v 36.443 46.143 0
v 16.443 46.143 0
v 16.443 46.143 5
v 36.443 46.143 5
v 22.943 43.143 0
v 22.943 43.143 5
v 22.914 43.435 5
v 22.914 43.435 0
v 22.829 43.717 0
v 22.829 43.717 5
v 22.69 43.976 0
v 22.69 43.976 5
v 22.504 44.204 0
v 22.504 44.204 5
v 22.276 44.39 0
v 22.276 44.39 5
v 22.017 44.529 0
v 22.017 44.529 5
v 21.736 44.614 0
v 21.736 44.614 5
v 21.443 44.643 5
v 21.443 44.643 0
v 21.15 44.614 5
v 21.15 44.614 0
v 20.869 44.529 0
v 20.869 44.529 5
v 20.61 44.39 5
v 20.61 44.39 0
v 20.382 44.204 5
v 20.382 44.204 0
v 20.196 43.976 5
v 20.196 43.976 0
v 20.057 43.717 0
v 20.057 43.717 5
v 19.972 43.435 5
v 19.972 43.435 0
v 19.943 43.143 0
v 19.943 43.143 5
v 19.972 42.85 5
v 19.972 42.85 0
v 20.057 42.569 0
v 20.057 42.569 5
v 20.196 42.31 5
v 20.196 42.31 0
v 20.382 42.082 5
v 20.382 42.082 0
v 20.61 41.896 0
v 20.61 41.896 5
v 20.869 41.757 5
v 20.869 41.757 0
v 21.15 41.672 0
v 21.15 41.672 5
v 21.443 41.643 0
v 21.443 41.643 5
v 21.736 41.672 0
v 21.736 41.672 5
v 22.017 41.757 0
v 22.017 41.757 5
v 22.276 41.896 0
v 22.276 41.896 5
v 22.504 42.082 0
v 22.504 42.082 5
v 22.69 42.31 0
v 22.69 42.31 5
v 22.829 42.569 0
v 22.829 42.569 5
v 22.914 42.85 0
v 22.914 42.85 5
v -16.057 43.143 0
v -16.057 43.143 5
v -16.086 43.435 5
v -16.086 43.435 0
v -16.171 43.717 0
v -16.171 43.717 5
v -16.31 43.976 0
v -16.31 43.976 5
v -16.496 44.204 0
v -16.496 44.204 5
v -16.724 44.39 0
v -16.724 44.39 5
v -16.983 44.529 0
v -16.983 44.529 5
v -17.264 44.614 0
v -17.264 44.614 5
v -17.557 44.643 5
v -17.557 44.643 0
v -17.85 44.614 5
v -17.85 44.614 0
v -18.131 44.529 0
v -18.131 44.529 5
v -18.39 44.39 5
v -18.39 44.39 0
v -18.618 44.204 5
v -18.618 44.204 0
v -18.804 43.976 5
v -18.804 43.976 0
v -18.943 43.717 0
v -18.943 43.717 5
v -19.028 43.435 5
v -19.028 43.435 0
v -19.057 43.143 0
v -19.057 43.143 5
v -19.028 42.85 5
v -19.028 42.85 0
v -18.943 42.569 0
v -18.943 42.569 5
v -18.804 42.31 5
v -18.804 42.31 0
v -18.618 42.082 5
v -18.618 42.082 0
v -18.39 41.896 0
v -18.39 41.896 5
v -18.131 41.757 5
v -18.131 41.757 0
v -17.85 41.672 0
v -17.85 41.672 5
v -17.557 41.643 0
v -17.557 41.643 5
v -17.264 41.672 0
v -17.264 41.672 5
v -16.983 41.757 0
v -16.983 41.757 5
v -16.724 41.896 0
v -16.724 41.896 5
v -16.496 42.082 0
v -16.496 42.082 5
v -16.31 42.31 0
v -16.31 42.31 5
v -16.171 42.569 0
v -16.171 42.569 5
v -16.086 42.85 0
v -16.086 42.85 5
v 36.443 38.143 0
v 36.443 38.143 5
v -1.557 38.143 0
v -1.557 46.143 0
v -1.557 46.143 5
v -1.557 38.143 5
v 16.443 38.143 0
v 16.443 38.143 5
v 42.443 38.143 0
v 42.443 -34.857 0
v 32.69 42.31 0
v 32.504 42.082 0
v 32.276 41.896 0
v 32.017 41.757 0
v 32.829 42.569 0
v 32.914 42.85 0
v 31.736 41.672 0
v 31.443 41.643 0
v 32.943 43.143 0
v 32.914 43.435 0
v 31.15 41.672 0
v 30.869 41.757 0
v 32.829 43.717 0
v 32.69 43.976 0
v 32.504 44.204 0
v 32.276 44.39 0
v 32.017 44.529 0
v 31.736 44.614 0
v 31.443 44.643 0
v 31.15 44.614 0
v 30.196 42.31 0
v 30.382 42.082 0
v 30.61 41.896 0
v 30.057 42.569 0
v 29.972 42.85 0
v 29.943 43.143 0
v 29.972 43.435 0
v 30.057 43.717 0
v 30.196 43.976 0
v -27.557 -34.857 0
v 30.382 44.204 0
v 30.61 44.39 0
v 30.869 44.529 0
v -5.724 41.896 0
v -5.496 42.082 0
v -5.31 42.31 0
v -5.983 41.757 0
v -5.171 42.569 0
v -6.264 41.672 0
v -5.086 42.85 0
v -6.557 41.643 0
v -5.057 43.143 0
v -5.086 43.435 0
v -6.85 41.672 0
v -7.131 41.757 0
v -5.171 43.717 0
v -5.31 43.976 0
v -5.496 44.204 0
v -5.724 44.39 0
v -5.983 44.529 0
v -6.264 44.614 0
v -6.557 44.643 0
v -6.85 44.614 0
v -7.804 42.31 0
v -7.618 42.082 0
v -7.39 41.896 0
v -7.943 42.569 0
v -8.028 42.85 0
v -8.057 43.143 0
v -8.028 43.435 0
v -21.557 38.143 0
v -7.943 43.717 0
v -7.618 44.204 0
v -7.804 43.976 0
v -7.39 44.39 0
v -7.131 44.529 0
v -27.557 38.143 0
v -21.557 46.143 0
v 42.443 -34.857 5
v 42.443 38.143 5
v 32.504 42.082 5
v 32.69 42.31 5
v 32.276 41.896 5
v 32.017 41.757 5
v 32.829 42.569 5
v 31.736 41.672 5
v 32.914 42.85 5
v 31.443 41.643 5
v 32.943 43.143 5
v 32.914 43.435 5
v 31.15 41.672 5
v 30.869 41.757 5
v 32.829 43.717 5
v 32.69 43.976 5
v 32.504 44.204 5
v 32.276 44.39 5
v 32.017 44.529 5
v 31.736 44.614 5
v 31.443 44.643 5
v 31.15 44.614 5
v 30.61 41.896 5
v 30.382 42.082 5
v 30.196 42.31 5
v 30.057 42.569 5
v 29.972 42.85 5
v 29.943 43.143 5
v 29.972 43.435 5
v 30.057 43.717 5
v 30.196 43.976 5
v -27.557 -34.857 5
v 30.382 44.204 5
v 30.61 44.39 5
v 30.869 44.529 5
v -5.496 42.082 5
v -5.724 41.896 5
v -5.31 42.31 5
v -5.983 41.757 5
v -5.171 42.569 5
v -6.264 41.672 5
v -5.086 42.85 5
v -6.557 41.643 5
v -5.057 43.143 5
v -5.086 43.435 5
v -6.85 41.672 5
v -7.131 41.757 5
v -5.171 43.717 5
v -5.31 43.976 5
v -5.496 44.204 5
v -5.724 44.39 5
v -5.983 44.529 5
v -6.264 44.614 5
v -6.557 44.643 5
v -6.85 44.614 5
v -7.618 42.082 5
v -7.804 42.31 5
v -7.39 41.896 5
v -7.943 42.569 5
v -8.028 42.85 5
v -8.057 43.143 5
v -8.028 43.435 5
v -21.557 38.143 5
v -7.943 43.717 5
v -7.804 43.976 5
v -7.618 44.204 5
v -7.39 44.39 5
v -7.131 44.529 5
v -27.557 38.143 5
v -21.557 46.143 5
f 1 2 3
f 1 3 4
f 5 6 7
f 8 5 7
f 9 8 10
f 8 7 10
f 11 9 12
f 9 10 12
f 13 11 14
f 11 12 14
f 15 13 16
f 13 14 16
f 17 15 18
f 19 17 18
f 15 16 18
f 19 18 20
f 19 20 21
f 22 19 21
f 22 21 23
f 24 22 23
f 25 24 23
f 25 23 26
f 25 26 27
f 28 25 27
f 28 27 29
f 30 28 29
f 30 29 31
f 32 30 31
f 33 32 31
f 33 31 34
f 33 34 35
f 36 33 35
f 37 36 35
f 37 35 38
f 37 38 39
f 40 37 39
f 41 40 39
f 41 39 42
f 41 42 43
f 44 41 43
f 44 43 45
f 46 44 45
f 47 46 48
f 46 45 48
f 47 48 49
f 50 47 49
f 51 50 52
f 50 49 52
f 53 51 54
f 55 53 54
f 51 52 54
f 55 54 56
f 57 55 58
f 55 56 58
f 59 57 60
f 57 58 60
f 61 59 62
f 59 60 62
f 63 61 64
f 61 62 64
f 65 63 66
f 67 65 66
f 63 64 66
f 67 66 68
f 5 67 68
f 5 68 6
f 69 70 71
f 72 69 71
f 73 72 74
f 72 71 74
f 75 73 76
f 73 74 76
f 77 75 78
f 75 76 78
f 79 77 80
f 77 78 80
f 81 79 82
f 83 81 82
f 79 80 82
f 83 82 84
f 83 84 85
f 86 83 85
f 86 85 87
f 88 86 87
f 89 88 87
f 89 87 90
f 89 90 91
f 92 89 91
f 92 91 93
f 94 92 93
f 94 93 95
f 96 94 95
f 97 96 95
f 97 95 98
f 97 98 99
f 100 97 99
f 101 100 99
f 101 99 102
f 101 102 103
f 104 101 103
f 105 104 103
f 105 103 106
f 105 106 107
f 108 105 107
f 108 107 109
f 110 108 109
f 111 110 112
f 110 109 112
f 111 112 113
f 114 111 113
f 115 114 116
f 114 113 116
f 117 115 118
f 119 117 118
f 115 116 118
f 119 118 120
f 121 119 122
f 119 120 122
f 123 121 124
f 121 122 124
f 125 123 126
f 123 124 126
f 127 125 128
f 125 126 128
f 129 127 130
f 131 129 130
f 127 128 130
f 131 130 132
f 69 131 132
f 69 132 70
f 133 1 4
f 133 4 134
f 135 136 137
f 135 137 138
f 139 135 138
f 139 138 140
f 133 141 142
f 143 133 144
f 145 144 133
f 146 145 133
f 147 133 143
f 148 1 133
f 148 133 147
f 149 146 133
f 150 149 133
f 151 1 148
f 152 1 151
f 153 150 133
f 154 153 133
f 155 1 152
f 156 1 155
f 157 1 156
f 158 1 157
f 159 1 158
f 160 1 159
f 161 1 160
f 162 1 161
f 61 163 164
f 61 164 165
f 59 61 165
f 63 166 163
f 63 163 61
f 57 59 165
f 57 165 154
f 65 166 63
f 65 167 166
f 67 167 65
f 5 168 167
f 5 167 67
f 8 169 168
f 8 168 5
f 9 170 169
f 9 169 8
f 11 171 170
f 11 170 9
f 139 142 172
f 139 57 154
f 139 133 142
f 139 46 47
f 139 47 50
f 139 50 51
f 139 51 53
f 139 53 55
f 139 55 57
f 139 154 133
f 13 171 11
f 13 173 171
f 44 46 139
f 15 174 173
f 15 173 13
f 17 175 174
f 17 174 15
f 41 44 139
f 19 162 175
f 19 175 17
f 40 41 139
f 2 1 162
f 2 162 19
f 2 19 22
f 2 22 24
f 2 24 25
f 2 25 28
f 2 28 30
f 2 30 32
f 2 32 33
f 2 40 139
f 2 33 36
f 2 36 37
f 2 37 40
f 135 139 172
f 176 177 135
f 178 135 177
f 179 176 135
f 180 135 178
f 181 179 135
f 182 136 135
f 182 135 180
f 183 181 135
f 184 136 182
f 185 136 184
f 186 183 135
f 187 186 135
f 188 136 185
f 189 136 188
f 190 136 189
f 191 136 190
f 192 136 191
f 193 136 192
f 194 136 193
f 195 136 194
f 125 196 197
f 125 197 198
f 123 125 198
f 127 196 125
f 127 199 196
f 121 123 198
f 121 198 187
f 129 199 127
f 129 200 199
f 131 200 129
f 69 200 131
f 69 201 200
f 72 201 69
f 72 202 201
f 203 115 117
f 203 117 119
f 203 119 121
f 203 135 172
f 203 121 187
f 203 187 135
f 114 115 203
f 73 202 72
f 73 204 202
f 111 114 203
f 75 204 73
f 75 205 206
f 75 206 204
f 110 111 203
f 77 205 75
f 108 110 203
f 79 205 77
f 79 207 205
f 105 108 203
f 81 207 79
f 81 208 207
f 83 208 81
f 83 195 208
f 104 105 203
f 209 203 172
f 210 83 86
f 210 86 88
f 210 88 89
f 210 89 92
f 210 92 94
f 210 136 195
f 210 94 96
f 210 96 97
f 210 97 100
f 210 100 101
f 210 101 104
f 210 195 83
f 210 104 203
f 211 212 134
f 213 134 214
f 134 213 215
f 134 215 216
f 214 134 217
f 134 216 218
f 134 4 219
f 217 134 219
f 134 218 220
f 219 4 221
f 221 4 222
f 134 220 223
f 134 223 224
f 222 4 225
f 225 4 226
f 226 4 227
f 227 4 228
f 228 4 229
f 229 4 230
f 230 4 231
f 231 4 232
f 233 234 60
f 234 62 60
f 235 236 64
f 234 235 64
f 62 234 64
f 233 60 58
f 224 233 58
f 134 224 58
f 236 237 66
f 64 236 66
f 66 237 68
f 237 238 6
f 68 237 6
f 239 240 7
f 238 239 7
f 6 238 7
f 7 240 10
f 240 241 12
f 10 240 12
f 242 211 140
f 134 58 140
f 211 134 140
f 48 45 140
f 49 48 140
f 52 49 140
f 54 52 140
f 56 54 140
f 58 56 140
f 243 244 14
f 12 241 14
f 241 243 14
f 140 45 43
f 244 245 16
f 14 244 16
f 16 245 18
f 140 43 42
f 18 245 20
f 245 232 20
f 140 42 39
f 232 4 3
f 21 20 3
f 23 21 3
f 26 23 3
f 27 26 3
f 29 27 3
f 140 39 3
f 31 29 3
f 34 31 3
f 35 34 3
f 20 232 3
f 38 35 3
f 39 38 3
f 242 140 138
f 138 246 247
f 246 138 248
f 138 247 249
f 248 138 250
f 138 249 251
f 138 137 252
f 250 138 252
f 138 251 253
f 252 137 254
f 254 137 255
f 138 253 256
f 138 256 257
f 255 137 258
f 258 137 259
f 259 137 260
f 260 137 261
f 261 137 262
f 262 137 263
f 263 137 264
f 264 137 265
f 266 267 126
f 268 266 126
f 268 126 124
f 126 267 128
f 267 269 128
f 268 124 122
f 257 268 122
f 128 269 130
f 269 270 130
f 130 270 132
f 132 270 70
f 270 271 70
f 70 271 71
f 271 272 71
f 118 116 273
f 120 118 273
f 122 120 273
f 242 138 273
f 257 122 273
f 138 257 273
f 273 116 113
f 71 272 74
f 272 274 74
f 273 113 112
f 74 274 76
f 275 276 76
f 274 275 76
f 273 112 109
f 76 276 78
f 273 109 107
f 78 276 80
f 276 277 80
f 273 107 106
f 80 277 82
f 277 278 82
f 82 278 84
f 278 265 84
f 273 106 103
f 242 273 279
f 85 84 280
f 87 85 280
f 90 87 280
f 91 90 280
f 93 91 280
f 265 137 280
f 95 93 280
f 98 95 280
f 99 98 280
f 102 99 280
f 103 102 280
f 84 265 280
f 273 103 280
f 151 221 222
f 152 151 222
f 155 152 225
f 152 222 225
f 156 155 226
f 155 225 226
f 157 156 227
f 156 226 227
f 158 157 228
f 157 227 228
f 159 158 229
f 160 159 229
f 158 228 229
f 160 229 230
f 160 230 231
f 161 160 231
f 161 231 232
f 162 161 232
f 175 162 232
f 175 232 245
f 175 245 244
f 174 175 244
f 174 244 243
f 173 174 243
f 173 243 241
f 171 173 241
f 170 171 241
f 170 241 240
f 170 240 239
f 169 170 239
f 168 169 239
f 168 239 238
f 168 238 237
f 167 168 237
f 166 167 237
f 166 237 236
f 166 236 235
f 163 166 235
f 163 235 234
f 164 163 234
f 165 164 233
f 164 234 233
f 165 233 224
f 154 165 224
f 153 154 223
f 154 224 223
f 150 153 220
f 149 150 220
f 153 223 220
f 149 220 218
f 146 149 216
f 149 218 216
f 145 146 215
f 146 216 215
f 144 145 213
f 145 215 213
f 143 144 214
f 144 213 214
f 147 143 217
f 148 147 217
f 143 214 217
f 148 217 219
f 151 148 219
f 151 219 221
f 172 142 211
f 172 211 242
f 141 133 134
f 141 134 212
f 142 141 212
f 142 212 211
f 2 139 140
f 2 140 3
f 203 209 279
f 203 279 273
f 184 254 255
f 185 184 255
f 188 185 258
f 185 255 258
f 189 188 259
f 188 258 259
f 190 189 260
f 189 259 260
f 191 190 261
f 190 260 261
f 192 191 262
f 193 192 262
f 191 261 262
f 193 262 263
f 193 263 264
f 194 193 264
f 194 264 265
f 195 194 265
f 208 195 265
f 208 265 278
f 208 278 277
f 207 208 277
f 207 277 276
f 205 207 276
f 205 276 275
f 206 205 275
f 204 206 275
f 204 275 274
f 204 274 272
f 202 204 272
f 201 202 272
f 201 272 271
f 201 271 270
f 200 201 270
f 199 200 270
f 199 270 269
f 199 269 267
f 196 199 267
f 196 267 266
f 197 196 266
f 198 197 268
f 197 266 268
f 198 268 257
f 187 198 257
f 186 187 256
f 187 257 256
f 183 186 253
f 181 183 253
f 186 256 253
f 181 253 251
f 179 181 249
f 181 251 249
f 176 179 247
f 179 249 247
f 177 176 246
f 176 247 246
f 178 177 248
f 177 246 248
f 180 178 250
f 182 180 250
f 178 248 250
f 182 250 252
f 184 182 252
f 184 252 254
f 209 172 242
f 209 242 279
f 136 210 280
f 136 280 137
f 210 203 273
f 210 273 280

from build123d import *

# Parameters (mm, degrees)
RESSALTO_EXTRUS_O1_DEPTH = 5
ESBO_O2_R                = 1.5
CORTE_EXTRUS_O1_DEPTH    = 10
ESBO_O3_R                = 1.5
CORTE_EXTRUS_O2_DEPTH    = 6


with BuildPart() as part:
    # Esboço1 → Ressalto-extrusão1 (new body)
    with BuildSketch(Plane.XY):
        Polygon((-1.556986729, 38.142857143), (16.443013271, 38.142857143), (16.443013271, 46.142857143), (36.443013271, 46.142857143), (36.443013271, 38.142857143), (42.443013271, 38.142857143), (42.443013271, -34.857142857), (-27.556986729, -34.857142857), (-27.556986729, 38.142857143), (-21.556986729, 38.142857143), (-21.556986729, 46.142857143), (-1.556986729, 46.142857143), align=None)
    extrude(amount=RESSALTO_EXTRUS_O1_DEPTH)

    # Esboço2 → Corte-extrusão1 (cut)
    with BuildSketch(Plane.XY.offset(5)):
        with Locations((-17.556986729, 43.142857143)):
            Circle(ESBO_O2_R)
        with Locations((-6.556986729, 43.142857143)):
            Circle(ESBO_O2_R)
    extrude(amount=-CORTE_EXTRUS_O1_DEPTH, mode=Mode.SUBTRACT)

    # Esboço3 → Corte-extrusão2 (cut, through all)
    with BuildSketch(Plane.XY.offset(5)):
        with Locations((21.443013271, 43.142857143)):
            Circle(ESBO_O3_R)
        with Locations((31.443013271, 43.142857143)):
            Circle(ESBO_O3_R)
    extrude(amount=-CORTE_EXTRUS_O2_DEPTH, mode=Mode.SUBTRACT)


solid = part.part
